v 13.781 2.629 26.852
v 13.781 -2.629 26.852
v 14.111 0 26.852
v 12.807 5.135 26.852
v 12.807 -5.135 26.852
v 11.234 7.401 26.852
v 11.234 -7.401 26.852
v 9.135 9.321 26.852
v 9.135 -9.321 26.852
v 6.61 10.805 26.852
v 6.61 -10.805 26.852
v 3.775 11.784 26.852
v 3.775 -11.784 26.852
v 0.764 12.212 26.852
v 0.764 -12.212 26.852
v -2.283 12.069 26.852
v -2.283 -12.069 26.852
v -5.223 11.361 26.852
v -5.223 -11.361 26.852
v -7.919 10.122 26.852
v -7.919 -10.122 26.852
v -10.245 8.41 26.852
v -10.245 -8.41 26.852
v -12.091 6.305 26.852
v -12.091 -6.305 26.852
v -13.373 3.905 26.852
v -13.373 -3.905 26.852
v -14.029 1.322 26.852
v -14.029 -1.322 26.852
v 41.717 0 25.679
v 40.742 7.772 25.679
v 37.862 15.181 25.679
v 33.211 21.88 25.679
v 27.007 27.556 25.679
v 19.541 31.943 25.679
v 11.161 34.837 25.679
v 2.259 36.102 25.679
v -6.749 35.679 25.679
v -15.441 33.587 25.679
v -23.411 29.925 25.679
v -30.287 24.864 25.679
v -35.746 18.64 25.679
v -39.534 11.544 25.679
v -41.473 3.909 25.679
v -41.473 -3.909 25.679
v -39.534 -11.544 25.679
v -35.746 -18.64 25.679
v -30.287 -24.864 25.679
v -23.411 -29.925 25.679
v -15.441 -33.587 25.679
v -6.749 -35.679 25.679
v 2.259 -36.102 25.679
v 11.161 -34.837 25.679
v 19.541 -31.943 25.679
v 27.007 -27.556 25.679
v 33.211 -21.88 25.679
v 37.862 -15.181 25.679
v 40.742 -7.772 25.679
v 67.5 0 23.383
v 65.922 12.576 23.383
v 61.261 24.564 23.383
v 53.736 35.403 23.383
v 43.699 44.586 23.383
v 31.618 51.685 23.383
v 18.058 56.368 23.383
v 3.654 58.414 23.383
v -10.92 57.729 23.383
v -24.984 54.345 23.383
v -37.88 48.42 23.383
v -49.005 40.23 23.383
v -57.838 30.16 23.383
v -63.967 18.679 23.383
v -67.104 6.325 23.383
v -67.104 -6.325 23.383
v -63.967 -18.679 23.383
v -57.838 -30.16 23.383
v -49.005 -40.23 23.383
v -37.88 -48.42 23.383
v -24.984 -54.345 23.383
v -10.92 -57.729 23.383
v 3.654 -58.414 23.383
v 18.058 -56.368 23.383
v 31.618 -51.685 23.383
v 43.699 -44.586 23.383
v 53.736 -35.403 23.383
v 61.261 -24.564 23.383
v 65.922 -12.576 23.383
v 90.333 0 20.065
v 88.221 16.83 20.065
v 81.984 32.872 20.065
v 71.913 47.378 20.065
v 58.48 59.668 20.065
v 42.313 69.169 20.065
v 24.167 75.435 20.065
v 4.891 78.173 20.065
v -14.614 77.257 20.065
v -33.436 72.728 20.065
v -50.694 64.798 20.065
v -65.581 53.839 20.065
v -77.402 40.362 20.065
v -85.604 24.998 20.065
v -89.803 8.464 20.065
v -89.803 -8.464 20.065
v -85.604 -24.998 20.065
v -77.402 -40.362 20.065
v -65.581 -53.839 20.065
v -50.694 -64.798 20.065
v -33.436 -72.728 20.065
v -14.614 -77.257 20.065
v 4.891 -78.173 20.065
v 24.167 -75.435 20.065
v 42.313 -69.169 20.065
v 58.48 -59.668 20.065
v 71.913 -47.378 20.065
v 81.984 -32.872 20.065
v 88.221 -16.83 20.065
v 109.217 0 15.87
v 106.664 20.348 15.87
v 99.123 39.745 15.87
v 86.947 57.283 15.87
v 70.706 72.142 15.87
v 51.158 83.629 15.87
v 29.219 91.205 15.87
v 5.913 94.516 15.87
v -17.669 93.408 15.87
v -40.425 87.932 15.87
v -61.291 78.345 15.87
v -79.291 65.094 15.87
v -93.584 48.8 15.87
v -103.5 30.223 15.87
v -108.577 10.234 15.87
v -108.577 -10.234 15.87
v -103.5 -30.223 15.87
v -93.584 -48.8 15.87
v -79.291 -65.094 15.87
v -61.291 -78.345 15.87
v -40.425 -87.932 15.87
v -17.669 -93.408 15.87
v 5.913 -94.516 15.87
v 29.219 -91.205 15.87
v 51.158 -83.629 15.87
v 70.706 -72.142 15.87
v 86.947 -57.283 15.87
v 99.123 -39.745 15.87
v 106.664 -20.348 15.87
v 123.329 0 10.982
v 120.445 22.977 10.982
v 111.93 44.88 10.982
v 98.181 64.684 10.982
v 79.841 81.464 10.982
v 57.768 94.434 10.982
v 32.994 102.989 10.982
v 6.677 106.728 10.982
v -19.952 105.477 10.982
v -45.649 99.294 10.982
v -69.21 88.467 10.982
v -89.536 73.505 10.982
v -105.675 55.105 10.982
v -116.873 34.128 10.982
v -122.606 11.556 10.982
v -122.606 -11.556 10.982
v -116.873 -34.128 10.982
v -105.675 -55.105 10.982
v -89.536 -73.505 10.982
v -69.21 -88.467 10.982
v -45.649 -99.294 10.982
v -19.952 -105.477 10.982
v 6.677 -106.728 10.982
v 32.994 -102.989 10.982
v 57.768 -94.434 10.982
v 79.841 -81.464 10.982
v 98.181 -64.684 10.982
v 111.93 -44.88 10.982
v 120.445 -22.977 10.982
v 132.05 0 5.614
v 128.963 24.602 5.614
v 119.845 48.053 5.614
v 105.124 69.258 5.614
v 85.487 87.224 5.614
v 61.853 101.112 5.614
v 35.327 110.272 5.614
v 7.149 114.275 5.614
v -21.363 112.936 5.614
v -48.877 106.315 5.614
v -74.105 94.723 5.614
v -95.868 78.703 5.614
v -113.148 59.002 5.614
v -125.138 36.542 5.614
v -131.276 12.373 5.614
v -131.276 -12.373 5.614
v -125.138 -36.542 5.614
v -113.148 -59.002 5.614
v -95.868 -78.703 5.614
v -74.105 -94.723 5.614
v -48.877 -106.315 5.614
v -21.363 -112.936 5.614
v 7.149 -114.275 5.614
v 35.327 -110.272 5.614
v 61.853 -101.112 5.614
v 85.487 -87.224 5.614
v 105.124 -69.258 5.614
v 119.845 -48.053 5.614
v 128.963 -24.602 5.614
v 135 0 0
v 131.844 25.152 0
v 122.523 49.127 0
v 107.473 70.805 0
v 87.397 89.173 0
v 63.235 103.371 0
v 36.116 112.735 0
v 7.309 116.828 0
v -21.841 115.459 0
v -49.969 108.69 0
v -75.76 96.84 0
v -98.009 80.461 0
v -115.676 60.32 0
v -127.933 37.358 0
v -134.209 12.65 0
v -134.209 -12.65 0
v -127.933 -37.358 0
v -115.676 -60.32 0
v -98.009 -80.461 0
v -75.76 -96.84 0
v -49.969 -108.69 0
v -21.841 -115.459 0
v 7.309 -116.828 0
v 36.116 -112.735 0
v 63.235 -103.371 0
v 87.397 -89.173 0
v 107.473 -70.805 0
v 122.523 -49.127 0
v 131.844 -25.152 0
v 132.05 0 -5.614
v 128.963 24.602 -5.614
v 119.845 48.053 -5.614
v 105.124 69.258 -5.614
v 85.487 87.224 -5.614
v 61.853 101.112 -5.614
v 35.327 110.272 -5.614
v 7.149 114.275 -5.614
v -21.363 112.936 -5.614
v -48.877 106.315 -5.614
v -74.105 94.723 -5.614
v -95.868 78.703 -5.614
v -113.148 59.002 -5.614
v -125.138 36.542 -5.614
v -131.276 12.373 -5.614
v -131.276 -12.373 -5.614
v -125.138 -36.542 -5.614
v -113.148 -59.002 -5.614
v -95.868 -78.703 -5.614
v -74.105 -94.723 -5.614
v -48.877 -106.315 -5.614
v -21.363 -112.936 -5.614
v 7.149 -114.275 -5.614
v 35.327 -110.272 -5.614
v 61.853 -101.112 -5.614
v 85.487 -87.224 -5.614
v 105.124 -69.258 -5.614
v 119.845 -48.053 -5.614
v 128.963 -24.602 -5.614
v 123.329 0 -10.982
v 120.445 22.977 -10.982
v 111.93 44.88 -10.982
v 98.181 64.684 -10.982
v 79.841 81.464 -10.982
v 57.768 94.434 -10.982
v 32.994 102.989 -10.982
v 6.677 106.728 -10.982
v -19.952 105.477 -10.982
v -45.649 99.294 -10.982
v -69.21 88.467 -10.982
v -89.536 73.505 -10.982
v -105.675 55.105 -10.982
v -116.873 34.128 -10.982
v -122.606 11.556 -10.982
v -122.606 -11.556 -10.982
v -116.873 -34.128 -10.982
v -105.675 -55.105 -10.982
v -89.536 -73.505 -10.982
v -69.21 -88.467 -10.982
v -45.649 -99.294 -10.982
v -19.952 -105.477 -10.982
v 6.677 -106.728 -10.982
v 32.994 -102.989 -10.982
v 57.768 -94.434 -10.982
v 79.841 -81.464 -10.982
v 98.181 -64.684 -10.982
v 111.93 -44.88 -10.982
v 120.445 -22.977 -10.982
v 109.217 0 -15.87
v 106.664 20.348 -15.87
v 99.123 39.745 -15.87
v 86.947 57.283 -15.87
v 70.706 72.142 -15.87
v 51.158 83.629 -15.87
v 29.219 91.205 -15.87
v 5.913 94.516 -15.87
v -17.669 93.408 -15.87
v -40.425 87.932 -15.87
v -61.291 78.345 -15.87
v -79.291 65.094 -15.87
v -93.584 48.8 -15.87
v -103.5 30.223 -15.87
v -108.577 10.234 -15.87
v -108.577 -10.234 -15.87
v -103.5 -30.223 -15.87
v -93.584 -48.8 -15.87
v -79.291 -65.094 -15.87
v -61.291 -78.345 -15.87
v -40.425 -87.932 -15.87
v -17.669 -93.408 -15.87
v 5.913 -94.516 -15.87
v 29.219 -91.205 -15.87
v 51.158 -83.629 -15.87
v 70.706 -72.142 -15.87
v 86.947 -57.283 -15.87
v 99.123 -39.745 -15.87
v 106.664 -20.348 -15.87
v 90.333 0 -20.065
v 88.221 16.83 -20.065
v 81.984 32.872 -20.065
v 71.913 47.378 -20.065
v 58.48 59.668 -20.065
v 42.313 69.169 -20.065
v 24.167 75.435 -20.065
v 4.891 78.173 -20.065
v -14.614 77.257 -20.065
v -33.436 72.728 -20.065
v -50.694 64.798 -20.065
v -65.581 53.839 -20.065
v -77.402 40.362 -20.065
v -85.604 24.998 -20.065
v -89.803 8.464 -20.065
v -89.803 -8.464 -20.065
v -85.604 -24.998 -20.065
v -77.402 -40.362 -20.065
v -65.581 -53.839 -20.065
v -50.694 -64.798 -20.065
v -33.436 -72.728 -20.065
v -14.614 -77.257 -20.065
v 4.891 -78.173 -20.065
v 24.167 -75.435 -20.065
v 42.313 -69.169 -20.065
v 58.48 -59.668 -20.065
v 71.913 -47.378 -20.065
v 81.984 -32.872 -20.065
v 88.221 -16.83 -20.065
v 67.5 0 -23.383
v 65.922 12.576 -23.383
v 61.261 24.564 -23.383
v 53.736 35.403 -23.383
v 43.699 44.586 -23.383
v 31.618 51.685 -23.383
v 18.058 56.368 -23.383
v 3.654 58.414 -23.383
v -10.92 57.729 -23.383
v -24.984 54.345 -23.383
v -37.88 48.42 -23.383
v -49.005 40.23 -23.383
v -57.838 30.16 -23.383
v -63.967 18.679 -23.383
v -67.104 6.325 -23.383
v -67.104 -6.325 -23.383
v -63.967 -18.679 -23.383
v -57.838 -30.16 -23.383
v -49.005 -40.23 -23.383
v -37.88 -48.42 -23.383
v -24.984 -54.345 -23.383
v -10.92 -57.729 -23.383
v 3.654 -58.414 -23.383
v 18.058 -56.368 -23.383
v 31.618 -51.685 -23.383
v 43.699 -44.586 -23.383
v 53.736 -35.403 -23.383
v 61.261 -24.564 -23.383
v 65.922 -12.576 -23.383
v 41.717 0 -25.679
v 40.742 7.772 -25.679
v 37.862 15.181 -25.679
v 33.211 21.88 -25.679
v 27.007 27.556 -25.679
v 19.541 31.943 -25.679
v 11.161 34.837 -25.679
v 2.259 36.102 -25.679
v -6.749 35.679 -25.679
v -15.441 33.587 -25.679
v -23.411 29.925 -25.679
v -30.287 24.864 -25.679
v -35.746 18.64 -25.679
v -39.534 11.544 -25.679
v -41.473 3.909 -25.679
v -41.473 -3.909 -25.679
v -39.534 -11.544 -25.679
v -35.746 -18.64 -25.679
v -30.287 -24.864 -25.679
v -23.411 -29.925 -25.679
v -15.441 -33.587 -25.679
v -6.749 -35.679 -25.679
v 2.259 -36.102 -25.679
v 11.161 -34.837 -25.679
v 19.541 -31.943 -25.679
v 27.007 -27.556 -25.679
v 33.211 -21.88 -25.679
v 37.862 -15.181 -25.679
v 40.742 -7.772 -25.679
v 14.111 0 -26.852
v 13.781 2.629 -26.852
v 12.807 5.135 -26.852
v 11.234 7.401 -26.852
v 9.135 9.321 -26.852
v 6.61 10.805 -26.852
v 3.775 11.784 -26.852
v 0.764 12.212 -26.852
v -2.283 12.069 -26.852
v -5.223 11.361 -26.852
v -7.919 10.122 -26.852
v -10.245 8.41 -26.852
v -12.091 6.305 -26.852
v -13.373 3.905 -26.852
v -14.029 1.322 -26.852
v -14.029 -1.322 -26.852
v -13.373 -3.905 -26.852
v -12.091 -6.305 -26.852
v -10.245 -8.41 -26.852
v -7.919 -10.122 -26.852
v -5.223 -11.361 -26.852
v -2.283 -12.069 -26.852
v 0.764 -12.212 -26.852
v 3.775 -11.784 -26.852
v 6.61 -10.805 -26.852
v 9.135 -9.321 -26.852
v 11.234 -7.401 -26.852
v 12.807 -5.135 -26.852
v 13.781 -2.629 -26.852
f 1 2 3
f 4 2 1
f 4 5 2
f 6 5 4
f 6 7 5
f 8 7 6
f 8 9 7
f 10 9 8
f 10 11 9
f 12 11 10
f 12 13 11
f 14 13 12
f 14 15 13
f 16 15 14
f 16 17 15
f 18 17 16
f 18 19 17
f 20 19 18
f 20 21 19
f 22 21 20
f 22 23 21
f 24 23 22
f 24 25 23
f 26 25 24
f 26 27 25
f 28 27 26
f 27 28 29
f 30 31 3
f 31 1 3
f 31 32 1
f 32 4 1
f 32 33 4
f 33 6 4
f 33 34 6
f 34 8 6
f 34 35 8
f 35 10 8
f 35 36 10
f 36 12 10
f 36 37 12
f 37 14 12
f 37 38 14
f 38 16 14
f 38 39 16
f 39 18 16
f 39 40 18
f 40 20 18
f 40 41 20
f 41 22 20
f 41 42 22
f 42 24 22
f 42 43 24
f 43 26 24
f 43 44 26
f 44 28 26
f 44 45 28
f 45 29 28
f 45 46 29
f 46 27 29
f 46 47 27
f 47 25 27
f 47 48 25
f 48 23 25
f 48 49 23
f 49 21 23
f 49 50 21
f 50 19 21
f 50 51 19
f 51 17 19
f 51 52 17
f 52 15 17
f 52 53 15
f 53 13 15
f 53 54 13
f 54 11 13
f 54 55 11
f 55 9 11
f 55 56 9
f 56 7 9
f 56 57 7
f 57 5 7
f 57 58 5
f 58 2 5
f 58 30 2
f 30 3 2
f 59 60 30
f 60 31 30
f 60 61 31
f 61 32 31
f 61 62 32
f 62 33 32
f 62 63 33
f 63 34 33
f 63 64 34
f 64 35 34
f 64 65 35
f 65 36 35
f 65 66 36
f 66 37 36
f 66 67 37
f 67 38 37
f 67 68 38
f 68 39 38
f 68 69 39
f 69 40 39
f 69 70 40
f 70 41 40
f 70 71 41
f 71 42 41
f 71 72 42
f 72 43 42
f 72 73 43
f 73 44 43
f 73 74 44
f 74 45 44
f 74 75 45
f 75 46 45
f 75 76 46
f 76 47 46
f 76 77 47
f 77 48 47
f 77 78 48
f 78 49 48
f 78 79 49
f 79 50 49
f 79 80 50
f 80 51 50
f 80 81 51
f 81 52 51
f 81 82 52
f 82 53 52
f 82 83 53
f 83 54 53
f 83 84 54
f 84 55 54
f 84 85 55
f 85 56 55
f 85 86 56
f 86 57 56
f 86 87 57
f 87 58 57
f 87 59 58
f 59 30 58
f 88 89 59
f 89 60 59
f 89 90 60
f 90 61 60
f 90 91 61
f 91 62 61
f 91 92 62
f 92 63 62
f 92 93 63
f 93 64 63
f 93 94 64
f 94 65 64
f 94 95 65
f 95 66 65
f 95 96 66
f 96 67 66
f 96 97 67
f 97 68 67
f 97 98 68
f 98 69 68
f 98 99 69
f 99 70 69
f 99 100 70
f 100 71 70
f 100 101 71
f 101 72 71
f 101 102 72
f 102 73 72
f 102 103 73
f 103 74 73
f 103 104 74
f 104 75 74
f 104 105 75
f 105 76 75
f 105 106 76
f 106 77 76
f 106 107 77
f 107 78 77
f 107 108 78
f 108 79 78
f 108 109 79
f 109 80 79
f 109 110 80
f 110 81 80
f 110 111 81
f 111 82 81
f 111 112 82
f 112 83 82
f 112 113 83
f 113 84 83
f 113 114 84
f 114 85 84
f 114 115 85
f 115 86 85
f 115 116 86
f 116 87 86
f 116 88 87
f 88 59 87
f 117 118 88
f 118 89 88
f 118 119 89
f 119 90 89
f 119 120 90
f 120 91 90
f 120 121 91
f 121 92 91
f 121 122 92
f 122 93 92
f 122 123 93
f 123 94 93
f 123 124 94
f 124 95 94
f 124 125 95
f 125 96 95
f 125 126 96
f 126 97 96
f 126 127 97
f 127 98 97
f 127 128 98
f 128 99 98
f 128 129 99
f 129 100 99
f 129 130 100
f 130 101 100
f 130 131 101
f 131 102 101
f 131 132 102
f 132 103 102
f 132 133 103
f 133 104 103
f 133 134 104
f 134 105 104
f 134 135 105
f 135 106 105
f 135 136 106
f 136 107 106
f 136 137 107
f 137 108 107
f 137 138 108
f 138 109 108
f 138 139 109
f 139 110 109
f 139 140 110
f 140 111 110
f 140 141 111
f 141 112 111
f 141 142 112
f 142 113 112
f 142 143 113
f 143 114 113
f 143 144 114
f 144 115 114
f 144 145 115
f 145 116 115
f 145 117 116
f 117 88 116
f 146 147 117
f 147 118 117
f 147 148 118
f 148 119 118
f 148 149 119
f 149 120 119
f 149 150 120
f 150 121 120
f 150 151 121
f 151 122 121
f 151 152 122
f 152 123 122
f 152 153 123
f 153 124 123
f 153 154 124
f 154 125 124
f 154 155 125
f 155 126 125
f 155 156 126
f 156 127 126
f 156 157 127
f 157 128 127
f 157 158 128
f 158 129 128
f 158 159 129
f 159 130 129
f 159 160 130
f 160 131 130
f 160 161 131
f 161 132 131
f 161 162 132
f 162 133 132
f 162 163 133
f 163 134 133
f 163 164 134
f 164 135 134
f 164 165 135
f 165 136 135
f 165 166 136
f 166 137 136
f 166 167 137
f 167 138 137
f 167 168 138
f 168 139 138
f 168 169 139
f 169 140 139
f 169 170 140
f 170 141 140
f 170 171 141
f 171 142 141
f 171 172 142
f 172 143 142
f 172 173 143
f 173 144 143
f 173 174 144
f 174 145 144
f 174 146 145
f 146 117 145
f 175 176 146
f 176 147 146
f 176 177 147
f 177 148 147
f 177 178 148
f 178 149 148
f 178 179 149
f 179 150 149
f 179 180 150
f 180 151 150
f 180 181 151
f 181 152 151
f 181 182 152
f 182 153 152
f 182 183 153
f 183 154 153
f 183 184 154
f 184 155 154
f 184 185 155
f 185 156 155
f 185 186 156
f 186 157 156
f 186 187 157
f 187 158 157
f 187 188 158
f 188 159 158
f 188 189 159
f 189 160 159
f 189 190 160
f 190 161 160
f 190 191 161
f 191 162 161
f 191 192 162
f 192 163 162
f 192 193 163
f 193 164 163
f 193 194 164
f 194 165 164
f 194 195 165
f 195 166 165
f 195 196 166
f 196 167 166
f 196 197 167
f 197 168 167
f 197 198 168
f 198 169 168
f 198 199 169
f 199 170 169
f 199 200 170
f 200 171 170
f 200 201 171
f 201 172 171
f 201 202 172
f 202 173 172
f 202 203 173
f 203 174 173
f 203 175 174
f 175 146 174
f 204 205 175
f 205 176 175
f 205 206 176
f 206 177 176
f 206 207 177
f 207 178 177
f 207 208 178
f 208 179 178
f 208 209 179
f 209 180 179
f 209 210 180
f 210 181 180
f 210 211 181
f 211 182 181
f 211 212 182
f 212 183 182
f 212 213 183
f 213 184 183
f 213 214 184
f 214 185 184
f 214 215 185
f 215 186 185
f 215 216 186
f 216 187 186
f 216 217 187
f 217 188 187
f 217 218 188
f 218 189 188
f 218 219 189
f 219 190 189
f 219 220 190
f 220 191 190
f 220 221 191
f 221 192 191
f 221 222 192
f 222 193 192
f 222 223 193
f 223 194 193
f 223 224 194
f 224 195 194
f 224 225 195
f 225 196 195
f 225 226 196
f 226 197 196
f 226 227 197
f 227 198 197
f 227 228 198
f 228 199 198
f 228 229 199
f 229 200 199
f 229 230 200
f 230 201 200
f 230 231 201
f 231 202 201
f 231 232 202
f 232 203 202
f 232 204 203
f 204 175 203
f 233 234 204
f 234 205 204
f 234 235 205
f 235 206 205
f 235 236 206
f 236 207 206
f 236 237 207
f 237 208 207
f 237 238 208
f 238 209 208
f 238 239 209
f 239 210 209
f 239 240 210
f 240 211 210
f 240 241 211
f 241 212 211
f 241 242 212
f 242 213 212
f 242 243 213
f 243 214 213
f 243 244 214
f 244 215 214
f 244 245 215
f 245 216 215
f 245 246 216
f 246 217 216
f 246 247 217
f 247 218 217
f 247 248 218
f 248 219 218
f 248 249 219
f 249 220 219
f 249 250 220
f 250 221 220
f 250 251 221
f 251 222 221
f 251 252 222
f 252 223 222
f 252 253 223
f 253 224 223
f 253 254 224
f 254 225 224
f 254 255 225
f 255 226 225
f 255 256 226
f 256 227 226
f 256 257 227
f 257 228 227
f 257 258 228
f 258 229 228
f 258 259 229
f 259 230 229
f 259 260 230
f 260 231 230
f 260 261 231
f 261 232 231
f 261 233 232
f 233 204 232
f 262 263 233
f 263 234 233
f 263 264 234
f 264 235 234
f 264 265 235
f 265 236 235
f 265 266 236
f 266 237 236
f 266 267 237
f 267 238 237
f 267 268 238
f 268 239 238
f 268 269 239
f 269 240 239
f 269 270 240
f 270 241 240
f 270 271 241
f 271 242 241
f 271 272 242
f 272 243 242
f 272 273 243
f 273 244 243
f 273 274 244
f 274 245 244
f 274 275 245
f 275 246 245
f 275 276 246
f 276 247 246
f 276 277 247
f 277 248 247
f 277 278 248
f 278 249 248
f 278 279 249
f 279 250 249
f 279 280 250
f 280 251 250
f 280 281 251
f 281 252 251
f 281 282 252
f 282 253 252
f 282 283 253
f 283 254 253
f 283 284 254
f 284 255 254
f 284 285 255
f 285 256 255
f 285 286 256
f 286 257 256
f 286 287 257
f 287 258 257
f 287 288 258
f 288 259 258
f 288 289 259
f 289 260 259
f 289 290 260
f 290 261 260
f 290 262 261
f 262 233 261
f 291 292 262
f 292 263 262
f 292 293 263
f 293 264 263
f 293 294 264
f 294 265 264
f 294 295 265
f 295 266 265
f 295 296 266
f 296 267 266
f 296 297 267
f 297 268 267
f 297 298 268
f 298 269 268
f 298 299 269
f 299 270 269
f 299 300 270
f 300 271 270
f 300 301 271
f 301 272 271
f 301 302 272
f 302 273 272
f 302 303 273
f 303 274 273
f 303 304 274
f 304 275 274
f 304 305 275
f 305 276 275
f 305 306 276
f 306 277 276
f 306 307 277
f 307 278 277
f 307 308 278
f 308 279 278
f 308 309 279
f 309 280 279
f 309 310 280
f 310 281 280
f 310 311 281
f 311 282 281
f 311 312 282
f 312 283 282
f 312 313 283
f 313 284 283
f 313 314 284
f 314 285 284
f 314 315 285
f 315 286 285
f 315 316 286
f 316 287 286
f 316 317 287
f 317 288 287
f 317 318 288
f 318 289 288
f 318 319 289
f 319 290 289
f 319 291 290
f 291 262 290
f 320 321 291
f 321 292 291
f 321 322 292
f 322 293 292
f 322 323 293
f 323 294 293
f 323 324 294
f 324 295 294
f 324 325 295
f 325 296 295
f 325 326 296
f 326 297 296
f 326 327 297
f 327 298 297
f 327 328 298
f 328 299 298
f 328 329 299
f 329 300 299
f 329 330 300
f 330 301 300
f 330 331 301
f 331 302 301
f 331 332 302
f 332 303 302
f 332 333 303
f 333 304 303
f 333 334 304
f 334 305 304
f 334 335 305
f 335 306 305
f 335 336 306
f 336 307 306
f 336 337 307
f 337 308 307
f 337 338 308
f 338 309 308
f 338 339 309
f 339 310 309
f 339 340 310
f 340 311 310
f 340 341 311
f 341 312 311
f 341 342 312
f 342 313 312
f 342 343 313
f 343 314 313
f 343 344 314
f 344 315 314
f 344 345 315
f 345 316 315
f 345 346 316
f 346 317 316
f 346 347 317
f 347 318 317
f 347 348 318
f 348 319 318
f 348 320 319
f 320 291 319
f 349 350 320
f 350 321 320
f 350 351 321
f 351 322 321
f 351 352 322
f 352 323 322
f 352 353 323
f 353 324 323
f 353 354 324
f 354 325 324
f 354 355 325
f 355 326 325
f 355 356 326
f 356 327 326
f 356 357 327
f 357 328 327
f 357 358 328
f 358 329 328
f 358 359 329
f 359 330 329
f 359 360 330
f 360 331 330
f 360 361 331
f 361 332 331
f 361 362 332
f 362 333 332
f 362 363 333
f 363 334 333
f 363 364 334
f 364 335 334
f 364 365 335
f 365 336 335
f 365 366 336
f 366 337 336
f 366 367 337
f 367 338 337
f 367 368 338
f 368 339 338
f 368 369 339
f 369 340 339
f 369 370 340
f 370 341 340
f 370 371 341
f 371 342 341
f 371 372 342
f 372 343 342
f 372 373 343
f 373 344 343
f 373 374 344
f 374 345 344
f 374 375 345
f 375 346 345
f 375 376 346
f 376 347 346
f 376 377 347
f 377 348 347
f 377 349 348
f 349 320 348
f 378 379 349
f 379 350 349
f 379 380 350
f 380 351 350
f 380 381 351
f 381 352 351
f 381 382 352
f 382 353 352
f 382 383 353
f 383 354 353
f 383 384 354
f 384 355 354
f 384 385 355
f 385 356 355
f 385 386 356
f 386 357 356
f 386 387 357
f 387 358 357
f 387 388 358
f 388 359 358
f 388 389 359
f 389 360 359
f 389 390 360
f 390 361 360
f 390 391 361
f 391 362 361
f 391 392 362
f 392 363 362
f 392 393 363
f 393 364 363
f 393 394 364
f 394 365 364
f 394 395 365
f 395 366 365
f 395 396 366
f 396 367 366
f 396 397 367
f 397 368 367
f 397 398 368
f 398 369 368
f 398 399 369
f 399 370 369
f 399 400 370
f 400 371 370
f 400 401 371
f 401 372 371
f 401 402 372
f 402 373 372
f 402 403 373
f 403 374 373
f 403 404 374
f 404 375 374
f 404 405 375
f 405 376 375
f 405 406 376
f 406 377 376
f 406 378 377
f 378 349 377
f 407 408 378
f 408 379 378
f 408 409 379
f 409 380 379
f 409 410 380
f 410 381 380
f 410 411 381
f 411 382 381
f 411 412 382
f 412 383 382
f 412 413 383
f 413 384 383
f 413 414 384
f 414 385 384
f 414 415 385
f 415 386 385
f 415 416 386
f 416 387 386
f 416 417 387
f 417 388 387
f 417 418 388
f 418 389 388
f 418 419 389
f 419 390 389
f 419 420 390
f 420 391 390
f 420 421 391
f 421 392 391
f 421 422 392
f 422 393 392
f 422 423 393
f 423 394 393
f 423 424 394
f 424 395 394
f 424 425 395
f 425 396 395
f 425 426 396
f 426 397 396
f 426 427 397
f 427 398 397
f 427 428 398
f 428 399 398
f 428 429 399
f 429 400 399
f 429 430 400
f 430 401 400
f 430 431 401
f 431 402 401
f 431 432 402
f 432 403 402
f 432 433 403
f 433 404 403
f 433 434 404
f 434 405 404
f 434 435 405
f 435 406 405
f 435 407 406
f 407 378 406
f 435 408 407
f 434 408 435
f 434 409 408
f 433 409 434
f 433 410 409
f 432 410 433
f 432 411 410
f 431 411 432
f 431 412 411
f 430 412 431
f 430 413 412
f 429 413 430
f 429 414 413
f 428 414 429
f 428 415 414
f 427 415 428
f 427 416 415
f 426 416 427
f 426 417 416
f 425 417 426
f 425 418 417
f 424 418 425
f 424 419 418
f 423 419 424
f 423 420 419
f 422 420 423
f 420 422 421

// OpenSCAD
// Generated by SolidPython 1.0.1 on 2020-07-29 00:46:52


scale(v = [15, 13, 3]) {
	sphere(r = 9);
}
/***********************************************
*********      SolidPython code:      **********
************************************************
 
# import packages: SolidPython
from solid import *
from solid.utils import *
from itertools import chain, combinations, permutations


class Resize:

    def __init__(self, scad_file):
        self.scad_file = scad_file
        #self.scad_file = import_scad(scad_file)
        # cone/cylinder param:
        self.r1 = 0
        self.r2 = 0
        self.h = 0
        # rectangular prism param:
        self.w = 0
        self.l = 0
        # ellipse param:
        self.r = 0

    # import OpenScad code (file name corresponds to shape)


    # classify shape + parameters
    def assign(self, param1, param2, param3):
        if self.scad_file == 'cone.scad':
            self.r1 = param1
            self.r2 = param2
            self.h = param3
        elif self.scad_file == 'cylinder.scad':
            self.r1 = param1
            self.r2 = param2
            self.h = param3
        elif self.scad_file == 'rectangularPrism.scad':
            self.h = param1
            self.l = param2
            self.w = param3
        else:
            self.r = param1
            self.h = param2

    # resize parameters
    def iterate(self):
        x = range(3, 20, 2)
        i = 1
        if self.scad_file == 'cone.scad':
            tempList = list(permutations(x, 2))
            for temp in tempList:
                param1 = temp[0]
                param2 = temp[1]
                filepath = 'produced_scad_files/' + 'cone' + str(param1) + '_' + str(param2) + '_' + '.scad'
                scad_render_to_file(cylinder(h=param1, r1=param2, r2=0), filepath)

        elif self.scad_file == 'cylinder.scad':
            tempList = list(permutations(x, 3))
            for temp in tempList:
                param1 = temp[0]
                param2 = temp[1]
                filepath = 'produced_scad_files/' + 'cylinder' + str(param1) + '_' + str(param2) + '_' + '.scad'
                scad_render_to_file(cylinder(h=param1, r1=param2, r2=param2), filepath)

        elif self.scad_file == 'rectangularPrism.scad':
            tempList = list(permutations(x, 3))
            for temp in tempList:
                param1 = temp[0]
                param2 = temp[1]
                param3 = temp[2]
                filepath = 'produced_scad_files/' + 'rectangularPrism' + str(param1) + '_' + str(param2) + '_' + str(
                    param3) + '.scad'
                scad_render_to_file(cube(size=(param1, param2, param3)), filepath)

        elif self.scad_file == 'ellipse.scad':
            tempList = list(permutations(x, 4))
            for temp in tempList:
                param1 = temp[0]
                param2 = temp[1]
                param3 = temp[2]
                param4 = temp[3]
                filepath = 'produced_scad_files/' + 'ellipse' + str(param1) + '_' + str(param2) + '_' + str(param3) + '_' + str(param4) + '.scad'
                scad_render_to_file(scale([param1, param2, param3])(sphere(r=param4)), filepath)

    def render_to_scadfile(self):
        scad_render_to_file(scad, 'example.scad') 
 
************************************************/
